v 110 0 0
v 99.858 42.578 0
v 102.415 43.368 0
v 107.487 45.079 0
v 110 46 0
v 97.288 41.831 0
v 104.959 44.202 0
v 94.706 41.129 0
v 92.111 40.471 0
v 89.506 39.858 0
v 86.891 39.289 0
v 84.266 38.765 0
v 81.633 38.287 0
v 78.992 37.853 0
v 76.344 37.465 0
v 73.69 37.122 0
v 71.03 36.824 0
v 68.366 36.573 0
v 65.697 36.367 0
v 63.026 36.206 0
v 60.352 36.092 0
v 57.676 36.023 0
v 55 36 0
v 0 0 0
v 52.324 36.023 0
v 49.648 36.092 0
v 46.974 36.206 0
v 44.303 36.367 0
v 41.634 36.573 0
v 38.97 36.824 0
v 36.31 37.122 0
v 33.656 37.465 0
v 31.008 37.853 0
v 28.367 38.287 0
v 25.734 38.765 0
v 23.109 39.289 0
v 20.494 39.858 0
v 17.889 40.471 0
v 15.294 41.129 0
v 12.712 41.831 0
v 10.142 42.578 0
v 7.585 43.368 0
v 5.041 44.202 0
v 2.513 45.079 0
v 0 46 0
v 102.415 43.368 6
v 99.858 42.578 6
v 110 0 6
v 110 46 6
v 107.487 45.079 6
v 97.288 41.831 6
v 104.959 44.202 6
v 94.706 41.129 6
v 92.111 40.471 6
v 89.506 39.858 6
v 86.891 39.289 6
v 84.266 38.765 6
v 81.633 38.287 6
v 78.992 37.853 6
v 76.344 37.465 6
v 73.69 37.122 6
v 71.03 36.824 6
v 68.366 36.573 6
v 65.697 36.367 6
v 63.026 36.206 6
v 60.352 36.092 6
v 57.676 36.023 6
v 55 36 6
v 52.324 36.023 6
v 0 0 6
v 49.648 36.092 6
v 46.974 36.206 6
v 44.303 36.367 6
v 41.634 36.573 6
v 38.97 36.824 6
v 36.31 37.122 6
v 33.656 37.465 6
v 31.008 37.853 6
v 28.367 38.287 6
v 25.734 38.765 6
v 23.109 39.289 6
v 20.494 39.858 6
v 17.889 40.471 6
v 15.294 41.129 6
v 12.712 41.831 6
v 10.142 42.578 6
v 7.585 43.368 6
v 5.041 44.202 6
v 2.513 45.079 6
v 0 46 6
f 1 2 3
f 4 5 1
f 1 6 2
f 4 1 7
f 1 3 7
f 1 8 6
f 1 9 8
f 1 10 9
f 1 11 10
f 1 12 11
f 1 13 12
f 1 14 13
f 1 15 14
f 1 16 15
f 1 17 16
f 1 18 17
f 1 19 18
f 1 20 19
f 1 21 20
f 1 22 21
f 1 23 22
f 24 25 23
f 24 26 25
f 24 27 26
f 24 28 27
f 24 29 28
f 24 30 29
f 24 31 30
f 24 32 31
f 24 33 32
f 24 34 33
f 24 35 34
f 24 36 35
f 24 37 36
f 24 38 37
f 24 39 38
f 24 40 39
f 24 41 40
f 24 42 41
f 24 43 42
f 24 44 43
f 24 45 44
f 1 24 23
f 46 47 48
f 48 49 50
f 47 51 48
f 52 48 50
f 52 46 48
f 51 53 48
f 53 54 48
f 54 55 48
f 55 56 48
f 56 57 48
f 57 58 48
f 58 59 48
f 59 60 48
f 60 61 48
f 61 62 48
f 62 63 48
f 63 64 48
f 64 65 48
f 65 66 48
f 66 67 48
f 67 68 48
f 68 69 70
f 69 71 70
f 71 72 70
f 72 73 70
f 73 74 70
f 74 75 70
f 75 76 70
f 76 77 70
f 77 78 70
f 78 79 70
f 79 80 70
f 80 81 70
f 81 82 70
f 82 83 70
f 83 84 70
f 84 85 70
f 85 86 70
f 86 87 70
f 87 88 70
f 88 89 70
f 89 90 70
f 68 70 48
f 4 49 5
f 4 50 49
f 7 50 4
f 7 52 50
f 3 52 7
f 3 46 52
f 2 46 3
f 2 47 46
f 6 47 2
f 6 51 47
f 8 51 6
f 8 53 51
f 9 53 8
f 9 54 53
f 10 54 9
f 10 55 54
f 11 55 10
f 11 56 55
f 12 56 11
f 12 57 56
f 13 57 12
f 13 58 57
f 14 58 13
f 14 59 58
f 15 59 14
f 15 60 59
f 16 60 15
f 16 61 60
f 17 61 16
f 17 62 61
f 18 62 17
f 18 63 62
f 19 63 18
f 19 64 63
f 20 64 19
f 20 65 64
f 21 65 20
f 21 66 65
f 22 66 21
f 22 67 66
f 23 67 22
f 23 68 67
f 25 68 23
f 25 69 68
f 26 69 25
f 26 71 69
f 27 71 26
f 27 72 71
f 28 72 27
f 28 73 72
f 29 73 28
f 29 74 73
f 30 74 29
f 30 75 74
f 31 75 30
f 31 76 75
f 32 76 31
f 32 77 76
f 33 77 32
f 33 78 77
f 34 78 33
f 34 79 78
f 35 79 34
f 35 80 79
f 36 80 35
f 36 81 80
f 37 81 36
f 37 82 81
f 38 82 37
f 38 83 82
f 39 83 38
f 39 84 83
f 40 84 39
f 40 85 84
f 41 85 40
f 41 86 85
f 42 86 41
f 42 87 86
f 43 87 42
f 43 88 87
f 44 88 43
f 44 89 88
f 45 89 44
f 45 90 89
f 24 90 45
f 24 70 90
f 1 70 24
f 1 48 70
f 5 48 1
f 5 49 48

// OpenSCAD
$fn = 32;

// ----------------------------------------------------------------------
// Arc profile plate: notch, 45 points
// ----------------------------------------------------------------------

// --- parameters (mm) ---
bar_l = 110;              // bar length, X
bar_w = 46;               // bar width, Y
notch_depth = 10;         // depth of the arc notch at mid-span
arc_r = 156.25;           // radius of the notch arc
arc_angle = 41.22;        // notch arc angle, degrees
arc_step = 1;             // sampling step of the notch arc, degrees
plate_t = 6;              // plate thickness, Z
fit_tol = 0.1;            // declared fit tolerance (prompt contract)
free_tol = 0.3;           // declared free tolerance (prompt contract)

profile = [[0, 0], [110, 0], [110, 46], [107.487, 45.079], [104.959, 44.202], [102.415, 43.368], [99.858, 42.578], [97.288, 41.831], [94.706, 41.129], [92.111, 40.471], [89.506, 39.858], [86.891, 39.289], [84.266, 38.765], [81.633, 38.287], [78.992, 37.853], [76.344, 37.465], [73.69, 37.122], [71.03, 36.824], [68.366, 36.573], [65.697, 36.367], [63.026, 36.206], [60.352, 36.092], [57.676, 36.023], [55, 36], [52.324, 36.023], [49.648, 36.092], [46.974, 36.206], [44.303, 36.367], [41.634, 36.573], [38.97, 36.824], [36.31, 37.122], [33.656, 37.465], [31.008, 37.853], [28.367, 38.287], [25.734, 38.765], [23.109, 39.289], [20.494, 39.858], [17.889, 40.471], [15.294, 41.129], [12.712, 41.831], [10.142, 42.578], [7.585, 43.368], [5.041, 44.202], [2.513, 45.079], [0, 46]];  // primary outline, 45 points, counter clockwise

// --- the one profile operation ---
linear_extrude(height = plate_t) polygon(points = profile);
